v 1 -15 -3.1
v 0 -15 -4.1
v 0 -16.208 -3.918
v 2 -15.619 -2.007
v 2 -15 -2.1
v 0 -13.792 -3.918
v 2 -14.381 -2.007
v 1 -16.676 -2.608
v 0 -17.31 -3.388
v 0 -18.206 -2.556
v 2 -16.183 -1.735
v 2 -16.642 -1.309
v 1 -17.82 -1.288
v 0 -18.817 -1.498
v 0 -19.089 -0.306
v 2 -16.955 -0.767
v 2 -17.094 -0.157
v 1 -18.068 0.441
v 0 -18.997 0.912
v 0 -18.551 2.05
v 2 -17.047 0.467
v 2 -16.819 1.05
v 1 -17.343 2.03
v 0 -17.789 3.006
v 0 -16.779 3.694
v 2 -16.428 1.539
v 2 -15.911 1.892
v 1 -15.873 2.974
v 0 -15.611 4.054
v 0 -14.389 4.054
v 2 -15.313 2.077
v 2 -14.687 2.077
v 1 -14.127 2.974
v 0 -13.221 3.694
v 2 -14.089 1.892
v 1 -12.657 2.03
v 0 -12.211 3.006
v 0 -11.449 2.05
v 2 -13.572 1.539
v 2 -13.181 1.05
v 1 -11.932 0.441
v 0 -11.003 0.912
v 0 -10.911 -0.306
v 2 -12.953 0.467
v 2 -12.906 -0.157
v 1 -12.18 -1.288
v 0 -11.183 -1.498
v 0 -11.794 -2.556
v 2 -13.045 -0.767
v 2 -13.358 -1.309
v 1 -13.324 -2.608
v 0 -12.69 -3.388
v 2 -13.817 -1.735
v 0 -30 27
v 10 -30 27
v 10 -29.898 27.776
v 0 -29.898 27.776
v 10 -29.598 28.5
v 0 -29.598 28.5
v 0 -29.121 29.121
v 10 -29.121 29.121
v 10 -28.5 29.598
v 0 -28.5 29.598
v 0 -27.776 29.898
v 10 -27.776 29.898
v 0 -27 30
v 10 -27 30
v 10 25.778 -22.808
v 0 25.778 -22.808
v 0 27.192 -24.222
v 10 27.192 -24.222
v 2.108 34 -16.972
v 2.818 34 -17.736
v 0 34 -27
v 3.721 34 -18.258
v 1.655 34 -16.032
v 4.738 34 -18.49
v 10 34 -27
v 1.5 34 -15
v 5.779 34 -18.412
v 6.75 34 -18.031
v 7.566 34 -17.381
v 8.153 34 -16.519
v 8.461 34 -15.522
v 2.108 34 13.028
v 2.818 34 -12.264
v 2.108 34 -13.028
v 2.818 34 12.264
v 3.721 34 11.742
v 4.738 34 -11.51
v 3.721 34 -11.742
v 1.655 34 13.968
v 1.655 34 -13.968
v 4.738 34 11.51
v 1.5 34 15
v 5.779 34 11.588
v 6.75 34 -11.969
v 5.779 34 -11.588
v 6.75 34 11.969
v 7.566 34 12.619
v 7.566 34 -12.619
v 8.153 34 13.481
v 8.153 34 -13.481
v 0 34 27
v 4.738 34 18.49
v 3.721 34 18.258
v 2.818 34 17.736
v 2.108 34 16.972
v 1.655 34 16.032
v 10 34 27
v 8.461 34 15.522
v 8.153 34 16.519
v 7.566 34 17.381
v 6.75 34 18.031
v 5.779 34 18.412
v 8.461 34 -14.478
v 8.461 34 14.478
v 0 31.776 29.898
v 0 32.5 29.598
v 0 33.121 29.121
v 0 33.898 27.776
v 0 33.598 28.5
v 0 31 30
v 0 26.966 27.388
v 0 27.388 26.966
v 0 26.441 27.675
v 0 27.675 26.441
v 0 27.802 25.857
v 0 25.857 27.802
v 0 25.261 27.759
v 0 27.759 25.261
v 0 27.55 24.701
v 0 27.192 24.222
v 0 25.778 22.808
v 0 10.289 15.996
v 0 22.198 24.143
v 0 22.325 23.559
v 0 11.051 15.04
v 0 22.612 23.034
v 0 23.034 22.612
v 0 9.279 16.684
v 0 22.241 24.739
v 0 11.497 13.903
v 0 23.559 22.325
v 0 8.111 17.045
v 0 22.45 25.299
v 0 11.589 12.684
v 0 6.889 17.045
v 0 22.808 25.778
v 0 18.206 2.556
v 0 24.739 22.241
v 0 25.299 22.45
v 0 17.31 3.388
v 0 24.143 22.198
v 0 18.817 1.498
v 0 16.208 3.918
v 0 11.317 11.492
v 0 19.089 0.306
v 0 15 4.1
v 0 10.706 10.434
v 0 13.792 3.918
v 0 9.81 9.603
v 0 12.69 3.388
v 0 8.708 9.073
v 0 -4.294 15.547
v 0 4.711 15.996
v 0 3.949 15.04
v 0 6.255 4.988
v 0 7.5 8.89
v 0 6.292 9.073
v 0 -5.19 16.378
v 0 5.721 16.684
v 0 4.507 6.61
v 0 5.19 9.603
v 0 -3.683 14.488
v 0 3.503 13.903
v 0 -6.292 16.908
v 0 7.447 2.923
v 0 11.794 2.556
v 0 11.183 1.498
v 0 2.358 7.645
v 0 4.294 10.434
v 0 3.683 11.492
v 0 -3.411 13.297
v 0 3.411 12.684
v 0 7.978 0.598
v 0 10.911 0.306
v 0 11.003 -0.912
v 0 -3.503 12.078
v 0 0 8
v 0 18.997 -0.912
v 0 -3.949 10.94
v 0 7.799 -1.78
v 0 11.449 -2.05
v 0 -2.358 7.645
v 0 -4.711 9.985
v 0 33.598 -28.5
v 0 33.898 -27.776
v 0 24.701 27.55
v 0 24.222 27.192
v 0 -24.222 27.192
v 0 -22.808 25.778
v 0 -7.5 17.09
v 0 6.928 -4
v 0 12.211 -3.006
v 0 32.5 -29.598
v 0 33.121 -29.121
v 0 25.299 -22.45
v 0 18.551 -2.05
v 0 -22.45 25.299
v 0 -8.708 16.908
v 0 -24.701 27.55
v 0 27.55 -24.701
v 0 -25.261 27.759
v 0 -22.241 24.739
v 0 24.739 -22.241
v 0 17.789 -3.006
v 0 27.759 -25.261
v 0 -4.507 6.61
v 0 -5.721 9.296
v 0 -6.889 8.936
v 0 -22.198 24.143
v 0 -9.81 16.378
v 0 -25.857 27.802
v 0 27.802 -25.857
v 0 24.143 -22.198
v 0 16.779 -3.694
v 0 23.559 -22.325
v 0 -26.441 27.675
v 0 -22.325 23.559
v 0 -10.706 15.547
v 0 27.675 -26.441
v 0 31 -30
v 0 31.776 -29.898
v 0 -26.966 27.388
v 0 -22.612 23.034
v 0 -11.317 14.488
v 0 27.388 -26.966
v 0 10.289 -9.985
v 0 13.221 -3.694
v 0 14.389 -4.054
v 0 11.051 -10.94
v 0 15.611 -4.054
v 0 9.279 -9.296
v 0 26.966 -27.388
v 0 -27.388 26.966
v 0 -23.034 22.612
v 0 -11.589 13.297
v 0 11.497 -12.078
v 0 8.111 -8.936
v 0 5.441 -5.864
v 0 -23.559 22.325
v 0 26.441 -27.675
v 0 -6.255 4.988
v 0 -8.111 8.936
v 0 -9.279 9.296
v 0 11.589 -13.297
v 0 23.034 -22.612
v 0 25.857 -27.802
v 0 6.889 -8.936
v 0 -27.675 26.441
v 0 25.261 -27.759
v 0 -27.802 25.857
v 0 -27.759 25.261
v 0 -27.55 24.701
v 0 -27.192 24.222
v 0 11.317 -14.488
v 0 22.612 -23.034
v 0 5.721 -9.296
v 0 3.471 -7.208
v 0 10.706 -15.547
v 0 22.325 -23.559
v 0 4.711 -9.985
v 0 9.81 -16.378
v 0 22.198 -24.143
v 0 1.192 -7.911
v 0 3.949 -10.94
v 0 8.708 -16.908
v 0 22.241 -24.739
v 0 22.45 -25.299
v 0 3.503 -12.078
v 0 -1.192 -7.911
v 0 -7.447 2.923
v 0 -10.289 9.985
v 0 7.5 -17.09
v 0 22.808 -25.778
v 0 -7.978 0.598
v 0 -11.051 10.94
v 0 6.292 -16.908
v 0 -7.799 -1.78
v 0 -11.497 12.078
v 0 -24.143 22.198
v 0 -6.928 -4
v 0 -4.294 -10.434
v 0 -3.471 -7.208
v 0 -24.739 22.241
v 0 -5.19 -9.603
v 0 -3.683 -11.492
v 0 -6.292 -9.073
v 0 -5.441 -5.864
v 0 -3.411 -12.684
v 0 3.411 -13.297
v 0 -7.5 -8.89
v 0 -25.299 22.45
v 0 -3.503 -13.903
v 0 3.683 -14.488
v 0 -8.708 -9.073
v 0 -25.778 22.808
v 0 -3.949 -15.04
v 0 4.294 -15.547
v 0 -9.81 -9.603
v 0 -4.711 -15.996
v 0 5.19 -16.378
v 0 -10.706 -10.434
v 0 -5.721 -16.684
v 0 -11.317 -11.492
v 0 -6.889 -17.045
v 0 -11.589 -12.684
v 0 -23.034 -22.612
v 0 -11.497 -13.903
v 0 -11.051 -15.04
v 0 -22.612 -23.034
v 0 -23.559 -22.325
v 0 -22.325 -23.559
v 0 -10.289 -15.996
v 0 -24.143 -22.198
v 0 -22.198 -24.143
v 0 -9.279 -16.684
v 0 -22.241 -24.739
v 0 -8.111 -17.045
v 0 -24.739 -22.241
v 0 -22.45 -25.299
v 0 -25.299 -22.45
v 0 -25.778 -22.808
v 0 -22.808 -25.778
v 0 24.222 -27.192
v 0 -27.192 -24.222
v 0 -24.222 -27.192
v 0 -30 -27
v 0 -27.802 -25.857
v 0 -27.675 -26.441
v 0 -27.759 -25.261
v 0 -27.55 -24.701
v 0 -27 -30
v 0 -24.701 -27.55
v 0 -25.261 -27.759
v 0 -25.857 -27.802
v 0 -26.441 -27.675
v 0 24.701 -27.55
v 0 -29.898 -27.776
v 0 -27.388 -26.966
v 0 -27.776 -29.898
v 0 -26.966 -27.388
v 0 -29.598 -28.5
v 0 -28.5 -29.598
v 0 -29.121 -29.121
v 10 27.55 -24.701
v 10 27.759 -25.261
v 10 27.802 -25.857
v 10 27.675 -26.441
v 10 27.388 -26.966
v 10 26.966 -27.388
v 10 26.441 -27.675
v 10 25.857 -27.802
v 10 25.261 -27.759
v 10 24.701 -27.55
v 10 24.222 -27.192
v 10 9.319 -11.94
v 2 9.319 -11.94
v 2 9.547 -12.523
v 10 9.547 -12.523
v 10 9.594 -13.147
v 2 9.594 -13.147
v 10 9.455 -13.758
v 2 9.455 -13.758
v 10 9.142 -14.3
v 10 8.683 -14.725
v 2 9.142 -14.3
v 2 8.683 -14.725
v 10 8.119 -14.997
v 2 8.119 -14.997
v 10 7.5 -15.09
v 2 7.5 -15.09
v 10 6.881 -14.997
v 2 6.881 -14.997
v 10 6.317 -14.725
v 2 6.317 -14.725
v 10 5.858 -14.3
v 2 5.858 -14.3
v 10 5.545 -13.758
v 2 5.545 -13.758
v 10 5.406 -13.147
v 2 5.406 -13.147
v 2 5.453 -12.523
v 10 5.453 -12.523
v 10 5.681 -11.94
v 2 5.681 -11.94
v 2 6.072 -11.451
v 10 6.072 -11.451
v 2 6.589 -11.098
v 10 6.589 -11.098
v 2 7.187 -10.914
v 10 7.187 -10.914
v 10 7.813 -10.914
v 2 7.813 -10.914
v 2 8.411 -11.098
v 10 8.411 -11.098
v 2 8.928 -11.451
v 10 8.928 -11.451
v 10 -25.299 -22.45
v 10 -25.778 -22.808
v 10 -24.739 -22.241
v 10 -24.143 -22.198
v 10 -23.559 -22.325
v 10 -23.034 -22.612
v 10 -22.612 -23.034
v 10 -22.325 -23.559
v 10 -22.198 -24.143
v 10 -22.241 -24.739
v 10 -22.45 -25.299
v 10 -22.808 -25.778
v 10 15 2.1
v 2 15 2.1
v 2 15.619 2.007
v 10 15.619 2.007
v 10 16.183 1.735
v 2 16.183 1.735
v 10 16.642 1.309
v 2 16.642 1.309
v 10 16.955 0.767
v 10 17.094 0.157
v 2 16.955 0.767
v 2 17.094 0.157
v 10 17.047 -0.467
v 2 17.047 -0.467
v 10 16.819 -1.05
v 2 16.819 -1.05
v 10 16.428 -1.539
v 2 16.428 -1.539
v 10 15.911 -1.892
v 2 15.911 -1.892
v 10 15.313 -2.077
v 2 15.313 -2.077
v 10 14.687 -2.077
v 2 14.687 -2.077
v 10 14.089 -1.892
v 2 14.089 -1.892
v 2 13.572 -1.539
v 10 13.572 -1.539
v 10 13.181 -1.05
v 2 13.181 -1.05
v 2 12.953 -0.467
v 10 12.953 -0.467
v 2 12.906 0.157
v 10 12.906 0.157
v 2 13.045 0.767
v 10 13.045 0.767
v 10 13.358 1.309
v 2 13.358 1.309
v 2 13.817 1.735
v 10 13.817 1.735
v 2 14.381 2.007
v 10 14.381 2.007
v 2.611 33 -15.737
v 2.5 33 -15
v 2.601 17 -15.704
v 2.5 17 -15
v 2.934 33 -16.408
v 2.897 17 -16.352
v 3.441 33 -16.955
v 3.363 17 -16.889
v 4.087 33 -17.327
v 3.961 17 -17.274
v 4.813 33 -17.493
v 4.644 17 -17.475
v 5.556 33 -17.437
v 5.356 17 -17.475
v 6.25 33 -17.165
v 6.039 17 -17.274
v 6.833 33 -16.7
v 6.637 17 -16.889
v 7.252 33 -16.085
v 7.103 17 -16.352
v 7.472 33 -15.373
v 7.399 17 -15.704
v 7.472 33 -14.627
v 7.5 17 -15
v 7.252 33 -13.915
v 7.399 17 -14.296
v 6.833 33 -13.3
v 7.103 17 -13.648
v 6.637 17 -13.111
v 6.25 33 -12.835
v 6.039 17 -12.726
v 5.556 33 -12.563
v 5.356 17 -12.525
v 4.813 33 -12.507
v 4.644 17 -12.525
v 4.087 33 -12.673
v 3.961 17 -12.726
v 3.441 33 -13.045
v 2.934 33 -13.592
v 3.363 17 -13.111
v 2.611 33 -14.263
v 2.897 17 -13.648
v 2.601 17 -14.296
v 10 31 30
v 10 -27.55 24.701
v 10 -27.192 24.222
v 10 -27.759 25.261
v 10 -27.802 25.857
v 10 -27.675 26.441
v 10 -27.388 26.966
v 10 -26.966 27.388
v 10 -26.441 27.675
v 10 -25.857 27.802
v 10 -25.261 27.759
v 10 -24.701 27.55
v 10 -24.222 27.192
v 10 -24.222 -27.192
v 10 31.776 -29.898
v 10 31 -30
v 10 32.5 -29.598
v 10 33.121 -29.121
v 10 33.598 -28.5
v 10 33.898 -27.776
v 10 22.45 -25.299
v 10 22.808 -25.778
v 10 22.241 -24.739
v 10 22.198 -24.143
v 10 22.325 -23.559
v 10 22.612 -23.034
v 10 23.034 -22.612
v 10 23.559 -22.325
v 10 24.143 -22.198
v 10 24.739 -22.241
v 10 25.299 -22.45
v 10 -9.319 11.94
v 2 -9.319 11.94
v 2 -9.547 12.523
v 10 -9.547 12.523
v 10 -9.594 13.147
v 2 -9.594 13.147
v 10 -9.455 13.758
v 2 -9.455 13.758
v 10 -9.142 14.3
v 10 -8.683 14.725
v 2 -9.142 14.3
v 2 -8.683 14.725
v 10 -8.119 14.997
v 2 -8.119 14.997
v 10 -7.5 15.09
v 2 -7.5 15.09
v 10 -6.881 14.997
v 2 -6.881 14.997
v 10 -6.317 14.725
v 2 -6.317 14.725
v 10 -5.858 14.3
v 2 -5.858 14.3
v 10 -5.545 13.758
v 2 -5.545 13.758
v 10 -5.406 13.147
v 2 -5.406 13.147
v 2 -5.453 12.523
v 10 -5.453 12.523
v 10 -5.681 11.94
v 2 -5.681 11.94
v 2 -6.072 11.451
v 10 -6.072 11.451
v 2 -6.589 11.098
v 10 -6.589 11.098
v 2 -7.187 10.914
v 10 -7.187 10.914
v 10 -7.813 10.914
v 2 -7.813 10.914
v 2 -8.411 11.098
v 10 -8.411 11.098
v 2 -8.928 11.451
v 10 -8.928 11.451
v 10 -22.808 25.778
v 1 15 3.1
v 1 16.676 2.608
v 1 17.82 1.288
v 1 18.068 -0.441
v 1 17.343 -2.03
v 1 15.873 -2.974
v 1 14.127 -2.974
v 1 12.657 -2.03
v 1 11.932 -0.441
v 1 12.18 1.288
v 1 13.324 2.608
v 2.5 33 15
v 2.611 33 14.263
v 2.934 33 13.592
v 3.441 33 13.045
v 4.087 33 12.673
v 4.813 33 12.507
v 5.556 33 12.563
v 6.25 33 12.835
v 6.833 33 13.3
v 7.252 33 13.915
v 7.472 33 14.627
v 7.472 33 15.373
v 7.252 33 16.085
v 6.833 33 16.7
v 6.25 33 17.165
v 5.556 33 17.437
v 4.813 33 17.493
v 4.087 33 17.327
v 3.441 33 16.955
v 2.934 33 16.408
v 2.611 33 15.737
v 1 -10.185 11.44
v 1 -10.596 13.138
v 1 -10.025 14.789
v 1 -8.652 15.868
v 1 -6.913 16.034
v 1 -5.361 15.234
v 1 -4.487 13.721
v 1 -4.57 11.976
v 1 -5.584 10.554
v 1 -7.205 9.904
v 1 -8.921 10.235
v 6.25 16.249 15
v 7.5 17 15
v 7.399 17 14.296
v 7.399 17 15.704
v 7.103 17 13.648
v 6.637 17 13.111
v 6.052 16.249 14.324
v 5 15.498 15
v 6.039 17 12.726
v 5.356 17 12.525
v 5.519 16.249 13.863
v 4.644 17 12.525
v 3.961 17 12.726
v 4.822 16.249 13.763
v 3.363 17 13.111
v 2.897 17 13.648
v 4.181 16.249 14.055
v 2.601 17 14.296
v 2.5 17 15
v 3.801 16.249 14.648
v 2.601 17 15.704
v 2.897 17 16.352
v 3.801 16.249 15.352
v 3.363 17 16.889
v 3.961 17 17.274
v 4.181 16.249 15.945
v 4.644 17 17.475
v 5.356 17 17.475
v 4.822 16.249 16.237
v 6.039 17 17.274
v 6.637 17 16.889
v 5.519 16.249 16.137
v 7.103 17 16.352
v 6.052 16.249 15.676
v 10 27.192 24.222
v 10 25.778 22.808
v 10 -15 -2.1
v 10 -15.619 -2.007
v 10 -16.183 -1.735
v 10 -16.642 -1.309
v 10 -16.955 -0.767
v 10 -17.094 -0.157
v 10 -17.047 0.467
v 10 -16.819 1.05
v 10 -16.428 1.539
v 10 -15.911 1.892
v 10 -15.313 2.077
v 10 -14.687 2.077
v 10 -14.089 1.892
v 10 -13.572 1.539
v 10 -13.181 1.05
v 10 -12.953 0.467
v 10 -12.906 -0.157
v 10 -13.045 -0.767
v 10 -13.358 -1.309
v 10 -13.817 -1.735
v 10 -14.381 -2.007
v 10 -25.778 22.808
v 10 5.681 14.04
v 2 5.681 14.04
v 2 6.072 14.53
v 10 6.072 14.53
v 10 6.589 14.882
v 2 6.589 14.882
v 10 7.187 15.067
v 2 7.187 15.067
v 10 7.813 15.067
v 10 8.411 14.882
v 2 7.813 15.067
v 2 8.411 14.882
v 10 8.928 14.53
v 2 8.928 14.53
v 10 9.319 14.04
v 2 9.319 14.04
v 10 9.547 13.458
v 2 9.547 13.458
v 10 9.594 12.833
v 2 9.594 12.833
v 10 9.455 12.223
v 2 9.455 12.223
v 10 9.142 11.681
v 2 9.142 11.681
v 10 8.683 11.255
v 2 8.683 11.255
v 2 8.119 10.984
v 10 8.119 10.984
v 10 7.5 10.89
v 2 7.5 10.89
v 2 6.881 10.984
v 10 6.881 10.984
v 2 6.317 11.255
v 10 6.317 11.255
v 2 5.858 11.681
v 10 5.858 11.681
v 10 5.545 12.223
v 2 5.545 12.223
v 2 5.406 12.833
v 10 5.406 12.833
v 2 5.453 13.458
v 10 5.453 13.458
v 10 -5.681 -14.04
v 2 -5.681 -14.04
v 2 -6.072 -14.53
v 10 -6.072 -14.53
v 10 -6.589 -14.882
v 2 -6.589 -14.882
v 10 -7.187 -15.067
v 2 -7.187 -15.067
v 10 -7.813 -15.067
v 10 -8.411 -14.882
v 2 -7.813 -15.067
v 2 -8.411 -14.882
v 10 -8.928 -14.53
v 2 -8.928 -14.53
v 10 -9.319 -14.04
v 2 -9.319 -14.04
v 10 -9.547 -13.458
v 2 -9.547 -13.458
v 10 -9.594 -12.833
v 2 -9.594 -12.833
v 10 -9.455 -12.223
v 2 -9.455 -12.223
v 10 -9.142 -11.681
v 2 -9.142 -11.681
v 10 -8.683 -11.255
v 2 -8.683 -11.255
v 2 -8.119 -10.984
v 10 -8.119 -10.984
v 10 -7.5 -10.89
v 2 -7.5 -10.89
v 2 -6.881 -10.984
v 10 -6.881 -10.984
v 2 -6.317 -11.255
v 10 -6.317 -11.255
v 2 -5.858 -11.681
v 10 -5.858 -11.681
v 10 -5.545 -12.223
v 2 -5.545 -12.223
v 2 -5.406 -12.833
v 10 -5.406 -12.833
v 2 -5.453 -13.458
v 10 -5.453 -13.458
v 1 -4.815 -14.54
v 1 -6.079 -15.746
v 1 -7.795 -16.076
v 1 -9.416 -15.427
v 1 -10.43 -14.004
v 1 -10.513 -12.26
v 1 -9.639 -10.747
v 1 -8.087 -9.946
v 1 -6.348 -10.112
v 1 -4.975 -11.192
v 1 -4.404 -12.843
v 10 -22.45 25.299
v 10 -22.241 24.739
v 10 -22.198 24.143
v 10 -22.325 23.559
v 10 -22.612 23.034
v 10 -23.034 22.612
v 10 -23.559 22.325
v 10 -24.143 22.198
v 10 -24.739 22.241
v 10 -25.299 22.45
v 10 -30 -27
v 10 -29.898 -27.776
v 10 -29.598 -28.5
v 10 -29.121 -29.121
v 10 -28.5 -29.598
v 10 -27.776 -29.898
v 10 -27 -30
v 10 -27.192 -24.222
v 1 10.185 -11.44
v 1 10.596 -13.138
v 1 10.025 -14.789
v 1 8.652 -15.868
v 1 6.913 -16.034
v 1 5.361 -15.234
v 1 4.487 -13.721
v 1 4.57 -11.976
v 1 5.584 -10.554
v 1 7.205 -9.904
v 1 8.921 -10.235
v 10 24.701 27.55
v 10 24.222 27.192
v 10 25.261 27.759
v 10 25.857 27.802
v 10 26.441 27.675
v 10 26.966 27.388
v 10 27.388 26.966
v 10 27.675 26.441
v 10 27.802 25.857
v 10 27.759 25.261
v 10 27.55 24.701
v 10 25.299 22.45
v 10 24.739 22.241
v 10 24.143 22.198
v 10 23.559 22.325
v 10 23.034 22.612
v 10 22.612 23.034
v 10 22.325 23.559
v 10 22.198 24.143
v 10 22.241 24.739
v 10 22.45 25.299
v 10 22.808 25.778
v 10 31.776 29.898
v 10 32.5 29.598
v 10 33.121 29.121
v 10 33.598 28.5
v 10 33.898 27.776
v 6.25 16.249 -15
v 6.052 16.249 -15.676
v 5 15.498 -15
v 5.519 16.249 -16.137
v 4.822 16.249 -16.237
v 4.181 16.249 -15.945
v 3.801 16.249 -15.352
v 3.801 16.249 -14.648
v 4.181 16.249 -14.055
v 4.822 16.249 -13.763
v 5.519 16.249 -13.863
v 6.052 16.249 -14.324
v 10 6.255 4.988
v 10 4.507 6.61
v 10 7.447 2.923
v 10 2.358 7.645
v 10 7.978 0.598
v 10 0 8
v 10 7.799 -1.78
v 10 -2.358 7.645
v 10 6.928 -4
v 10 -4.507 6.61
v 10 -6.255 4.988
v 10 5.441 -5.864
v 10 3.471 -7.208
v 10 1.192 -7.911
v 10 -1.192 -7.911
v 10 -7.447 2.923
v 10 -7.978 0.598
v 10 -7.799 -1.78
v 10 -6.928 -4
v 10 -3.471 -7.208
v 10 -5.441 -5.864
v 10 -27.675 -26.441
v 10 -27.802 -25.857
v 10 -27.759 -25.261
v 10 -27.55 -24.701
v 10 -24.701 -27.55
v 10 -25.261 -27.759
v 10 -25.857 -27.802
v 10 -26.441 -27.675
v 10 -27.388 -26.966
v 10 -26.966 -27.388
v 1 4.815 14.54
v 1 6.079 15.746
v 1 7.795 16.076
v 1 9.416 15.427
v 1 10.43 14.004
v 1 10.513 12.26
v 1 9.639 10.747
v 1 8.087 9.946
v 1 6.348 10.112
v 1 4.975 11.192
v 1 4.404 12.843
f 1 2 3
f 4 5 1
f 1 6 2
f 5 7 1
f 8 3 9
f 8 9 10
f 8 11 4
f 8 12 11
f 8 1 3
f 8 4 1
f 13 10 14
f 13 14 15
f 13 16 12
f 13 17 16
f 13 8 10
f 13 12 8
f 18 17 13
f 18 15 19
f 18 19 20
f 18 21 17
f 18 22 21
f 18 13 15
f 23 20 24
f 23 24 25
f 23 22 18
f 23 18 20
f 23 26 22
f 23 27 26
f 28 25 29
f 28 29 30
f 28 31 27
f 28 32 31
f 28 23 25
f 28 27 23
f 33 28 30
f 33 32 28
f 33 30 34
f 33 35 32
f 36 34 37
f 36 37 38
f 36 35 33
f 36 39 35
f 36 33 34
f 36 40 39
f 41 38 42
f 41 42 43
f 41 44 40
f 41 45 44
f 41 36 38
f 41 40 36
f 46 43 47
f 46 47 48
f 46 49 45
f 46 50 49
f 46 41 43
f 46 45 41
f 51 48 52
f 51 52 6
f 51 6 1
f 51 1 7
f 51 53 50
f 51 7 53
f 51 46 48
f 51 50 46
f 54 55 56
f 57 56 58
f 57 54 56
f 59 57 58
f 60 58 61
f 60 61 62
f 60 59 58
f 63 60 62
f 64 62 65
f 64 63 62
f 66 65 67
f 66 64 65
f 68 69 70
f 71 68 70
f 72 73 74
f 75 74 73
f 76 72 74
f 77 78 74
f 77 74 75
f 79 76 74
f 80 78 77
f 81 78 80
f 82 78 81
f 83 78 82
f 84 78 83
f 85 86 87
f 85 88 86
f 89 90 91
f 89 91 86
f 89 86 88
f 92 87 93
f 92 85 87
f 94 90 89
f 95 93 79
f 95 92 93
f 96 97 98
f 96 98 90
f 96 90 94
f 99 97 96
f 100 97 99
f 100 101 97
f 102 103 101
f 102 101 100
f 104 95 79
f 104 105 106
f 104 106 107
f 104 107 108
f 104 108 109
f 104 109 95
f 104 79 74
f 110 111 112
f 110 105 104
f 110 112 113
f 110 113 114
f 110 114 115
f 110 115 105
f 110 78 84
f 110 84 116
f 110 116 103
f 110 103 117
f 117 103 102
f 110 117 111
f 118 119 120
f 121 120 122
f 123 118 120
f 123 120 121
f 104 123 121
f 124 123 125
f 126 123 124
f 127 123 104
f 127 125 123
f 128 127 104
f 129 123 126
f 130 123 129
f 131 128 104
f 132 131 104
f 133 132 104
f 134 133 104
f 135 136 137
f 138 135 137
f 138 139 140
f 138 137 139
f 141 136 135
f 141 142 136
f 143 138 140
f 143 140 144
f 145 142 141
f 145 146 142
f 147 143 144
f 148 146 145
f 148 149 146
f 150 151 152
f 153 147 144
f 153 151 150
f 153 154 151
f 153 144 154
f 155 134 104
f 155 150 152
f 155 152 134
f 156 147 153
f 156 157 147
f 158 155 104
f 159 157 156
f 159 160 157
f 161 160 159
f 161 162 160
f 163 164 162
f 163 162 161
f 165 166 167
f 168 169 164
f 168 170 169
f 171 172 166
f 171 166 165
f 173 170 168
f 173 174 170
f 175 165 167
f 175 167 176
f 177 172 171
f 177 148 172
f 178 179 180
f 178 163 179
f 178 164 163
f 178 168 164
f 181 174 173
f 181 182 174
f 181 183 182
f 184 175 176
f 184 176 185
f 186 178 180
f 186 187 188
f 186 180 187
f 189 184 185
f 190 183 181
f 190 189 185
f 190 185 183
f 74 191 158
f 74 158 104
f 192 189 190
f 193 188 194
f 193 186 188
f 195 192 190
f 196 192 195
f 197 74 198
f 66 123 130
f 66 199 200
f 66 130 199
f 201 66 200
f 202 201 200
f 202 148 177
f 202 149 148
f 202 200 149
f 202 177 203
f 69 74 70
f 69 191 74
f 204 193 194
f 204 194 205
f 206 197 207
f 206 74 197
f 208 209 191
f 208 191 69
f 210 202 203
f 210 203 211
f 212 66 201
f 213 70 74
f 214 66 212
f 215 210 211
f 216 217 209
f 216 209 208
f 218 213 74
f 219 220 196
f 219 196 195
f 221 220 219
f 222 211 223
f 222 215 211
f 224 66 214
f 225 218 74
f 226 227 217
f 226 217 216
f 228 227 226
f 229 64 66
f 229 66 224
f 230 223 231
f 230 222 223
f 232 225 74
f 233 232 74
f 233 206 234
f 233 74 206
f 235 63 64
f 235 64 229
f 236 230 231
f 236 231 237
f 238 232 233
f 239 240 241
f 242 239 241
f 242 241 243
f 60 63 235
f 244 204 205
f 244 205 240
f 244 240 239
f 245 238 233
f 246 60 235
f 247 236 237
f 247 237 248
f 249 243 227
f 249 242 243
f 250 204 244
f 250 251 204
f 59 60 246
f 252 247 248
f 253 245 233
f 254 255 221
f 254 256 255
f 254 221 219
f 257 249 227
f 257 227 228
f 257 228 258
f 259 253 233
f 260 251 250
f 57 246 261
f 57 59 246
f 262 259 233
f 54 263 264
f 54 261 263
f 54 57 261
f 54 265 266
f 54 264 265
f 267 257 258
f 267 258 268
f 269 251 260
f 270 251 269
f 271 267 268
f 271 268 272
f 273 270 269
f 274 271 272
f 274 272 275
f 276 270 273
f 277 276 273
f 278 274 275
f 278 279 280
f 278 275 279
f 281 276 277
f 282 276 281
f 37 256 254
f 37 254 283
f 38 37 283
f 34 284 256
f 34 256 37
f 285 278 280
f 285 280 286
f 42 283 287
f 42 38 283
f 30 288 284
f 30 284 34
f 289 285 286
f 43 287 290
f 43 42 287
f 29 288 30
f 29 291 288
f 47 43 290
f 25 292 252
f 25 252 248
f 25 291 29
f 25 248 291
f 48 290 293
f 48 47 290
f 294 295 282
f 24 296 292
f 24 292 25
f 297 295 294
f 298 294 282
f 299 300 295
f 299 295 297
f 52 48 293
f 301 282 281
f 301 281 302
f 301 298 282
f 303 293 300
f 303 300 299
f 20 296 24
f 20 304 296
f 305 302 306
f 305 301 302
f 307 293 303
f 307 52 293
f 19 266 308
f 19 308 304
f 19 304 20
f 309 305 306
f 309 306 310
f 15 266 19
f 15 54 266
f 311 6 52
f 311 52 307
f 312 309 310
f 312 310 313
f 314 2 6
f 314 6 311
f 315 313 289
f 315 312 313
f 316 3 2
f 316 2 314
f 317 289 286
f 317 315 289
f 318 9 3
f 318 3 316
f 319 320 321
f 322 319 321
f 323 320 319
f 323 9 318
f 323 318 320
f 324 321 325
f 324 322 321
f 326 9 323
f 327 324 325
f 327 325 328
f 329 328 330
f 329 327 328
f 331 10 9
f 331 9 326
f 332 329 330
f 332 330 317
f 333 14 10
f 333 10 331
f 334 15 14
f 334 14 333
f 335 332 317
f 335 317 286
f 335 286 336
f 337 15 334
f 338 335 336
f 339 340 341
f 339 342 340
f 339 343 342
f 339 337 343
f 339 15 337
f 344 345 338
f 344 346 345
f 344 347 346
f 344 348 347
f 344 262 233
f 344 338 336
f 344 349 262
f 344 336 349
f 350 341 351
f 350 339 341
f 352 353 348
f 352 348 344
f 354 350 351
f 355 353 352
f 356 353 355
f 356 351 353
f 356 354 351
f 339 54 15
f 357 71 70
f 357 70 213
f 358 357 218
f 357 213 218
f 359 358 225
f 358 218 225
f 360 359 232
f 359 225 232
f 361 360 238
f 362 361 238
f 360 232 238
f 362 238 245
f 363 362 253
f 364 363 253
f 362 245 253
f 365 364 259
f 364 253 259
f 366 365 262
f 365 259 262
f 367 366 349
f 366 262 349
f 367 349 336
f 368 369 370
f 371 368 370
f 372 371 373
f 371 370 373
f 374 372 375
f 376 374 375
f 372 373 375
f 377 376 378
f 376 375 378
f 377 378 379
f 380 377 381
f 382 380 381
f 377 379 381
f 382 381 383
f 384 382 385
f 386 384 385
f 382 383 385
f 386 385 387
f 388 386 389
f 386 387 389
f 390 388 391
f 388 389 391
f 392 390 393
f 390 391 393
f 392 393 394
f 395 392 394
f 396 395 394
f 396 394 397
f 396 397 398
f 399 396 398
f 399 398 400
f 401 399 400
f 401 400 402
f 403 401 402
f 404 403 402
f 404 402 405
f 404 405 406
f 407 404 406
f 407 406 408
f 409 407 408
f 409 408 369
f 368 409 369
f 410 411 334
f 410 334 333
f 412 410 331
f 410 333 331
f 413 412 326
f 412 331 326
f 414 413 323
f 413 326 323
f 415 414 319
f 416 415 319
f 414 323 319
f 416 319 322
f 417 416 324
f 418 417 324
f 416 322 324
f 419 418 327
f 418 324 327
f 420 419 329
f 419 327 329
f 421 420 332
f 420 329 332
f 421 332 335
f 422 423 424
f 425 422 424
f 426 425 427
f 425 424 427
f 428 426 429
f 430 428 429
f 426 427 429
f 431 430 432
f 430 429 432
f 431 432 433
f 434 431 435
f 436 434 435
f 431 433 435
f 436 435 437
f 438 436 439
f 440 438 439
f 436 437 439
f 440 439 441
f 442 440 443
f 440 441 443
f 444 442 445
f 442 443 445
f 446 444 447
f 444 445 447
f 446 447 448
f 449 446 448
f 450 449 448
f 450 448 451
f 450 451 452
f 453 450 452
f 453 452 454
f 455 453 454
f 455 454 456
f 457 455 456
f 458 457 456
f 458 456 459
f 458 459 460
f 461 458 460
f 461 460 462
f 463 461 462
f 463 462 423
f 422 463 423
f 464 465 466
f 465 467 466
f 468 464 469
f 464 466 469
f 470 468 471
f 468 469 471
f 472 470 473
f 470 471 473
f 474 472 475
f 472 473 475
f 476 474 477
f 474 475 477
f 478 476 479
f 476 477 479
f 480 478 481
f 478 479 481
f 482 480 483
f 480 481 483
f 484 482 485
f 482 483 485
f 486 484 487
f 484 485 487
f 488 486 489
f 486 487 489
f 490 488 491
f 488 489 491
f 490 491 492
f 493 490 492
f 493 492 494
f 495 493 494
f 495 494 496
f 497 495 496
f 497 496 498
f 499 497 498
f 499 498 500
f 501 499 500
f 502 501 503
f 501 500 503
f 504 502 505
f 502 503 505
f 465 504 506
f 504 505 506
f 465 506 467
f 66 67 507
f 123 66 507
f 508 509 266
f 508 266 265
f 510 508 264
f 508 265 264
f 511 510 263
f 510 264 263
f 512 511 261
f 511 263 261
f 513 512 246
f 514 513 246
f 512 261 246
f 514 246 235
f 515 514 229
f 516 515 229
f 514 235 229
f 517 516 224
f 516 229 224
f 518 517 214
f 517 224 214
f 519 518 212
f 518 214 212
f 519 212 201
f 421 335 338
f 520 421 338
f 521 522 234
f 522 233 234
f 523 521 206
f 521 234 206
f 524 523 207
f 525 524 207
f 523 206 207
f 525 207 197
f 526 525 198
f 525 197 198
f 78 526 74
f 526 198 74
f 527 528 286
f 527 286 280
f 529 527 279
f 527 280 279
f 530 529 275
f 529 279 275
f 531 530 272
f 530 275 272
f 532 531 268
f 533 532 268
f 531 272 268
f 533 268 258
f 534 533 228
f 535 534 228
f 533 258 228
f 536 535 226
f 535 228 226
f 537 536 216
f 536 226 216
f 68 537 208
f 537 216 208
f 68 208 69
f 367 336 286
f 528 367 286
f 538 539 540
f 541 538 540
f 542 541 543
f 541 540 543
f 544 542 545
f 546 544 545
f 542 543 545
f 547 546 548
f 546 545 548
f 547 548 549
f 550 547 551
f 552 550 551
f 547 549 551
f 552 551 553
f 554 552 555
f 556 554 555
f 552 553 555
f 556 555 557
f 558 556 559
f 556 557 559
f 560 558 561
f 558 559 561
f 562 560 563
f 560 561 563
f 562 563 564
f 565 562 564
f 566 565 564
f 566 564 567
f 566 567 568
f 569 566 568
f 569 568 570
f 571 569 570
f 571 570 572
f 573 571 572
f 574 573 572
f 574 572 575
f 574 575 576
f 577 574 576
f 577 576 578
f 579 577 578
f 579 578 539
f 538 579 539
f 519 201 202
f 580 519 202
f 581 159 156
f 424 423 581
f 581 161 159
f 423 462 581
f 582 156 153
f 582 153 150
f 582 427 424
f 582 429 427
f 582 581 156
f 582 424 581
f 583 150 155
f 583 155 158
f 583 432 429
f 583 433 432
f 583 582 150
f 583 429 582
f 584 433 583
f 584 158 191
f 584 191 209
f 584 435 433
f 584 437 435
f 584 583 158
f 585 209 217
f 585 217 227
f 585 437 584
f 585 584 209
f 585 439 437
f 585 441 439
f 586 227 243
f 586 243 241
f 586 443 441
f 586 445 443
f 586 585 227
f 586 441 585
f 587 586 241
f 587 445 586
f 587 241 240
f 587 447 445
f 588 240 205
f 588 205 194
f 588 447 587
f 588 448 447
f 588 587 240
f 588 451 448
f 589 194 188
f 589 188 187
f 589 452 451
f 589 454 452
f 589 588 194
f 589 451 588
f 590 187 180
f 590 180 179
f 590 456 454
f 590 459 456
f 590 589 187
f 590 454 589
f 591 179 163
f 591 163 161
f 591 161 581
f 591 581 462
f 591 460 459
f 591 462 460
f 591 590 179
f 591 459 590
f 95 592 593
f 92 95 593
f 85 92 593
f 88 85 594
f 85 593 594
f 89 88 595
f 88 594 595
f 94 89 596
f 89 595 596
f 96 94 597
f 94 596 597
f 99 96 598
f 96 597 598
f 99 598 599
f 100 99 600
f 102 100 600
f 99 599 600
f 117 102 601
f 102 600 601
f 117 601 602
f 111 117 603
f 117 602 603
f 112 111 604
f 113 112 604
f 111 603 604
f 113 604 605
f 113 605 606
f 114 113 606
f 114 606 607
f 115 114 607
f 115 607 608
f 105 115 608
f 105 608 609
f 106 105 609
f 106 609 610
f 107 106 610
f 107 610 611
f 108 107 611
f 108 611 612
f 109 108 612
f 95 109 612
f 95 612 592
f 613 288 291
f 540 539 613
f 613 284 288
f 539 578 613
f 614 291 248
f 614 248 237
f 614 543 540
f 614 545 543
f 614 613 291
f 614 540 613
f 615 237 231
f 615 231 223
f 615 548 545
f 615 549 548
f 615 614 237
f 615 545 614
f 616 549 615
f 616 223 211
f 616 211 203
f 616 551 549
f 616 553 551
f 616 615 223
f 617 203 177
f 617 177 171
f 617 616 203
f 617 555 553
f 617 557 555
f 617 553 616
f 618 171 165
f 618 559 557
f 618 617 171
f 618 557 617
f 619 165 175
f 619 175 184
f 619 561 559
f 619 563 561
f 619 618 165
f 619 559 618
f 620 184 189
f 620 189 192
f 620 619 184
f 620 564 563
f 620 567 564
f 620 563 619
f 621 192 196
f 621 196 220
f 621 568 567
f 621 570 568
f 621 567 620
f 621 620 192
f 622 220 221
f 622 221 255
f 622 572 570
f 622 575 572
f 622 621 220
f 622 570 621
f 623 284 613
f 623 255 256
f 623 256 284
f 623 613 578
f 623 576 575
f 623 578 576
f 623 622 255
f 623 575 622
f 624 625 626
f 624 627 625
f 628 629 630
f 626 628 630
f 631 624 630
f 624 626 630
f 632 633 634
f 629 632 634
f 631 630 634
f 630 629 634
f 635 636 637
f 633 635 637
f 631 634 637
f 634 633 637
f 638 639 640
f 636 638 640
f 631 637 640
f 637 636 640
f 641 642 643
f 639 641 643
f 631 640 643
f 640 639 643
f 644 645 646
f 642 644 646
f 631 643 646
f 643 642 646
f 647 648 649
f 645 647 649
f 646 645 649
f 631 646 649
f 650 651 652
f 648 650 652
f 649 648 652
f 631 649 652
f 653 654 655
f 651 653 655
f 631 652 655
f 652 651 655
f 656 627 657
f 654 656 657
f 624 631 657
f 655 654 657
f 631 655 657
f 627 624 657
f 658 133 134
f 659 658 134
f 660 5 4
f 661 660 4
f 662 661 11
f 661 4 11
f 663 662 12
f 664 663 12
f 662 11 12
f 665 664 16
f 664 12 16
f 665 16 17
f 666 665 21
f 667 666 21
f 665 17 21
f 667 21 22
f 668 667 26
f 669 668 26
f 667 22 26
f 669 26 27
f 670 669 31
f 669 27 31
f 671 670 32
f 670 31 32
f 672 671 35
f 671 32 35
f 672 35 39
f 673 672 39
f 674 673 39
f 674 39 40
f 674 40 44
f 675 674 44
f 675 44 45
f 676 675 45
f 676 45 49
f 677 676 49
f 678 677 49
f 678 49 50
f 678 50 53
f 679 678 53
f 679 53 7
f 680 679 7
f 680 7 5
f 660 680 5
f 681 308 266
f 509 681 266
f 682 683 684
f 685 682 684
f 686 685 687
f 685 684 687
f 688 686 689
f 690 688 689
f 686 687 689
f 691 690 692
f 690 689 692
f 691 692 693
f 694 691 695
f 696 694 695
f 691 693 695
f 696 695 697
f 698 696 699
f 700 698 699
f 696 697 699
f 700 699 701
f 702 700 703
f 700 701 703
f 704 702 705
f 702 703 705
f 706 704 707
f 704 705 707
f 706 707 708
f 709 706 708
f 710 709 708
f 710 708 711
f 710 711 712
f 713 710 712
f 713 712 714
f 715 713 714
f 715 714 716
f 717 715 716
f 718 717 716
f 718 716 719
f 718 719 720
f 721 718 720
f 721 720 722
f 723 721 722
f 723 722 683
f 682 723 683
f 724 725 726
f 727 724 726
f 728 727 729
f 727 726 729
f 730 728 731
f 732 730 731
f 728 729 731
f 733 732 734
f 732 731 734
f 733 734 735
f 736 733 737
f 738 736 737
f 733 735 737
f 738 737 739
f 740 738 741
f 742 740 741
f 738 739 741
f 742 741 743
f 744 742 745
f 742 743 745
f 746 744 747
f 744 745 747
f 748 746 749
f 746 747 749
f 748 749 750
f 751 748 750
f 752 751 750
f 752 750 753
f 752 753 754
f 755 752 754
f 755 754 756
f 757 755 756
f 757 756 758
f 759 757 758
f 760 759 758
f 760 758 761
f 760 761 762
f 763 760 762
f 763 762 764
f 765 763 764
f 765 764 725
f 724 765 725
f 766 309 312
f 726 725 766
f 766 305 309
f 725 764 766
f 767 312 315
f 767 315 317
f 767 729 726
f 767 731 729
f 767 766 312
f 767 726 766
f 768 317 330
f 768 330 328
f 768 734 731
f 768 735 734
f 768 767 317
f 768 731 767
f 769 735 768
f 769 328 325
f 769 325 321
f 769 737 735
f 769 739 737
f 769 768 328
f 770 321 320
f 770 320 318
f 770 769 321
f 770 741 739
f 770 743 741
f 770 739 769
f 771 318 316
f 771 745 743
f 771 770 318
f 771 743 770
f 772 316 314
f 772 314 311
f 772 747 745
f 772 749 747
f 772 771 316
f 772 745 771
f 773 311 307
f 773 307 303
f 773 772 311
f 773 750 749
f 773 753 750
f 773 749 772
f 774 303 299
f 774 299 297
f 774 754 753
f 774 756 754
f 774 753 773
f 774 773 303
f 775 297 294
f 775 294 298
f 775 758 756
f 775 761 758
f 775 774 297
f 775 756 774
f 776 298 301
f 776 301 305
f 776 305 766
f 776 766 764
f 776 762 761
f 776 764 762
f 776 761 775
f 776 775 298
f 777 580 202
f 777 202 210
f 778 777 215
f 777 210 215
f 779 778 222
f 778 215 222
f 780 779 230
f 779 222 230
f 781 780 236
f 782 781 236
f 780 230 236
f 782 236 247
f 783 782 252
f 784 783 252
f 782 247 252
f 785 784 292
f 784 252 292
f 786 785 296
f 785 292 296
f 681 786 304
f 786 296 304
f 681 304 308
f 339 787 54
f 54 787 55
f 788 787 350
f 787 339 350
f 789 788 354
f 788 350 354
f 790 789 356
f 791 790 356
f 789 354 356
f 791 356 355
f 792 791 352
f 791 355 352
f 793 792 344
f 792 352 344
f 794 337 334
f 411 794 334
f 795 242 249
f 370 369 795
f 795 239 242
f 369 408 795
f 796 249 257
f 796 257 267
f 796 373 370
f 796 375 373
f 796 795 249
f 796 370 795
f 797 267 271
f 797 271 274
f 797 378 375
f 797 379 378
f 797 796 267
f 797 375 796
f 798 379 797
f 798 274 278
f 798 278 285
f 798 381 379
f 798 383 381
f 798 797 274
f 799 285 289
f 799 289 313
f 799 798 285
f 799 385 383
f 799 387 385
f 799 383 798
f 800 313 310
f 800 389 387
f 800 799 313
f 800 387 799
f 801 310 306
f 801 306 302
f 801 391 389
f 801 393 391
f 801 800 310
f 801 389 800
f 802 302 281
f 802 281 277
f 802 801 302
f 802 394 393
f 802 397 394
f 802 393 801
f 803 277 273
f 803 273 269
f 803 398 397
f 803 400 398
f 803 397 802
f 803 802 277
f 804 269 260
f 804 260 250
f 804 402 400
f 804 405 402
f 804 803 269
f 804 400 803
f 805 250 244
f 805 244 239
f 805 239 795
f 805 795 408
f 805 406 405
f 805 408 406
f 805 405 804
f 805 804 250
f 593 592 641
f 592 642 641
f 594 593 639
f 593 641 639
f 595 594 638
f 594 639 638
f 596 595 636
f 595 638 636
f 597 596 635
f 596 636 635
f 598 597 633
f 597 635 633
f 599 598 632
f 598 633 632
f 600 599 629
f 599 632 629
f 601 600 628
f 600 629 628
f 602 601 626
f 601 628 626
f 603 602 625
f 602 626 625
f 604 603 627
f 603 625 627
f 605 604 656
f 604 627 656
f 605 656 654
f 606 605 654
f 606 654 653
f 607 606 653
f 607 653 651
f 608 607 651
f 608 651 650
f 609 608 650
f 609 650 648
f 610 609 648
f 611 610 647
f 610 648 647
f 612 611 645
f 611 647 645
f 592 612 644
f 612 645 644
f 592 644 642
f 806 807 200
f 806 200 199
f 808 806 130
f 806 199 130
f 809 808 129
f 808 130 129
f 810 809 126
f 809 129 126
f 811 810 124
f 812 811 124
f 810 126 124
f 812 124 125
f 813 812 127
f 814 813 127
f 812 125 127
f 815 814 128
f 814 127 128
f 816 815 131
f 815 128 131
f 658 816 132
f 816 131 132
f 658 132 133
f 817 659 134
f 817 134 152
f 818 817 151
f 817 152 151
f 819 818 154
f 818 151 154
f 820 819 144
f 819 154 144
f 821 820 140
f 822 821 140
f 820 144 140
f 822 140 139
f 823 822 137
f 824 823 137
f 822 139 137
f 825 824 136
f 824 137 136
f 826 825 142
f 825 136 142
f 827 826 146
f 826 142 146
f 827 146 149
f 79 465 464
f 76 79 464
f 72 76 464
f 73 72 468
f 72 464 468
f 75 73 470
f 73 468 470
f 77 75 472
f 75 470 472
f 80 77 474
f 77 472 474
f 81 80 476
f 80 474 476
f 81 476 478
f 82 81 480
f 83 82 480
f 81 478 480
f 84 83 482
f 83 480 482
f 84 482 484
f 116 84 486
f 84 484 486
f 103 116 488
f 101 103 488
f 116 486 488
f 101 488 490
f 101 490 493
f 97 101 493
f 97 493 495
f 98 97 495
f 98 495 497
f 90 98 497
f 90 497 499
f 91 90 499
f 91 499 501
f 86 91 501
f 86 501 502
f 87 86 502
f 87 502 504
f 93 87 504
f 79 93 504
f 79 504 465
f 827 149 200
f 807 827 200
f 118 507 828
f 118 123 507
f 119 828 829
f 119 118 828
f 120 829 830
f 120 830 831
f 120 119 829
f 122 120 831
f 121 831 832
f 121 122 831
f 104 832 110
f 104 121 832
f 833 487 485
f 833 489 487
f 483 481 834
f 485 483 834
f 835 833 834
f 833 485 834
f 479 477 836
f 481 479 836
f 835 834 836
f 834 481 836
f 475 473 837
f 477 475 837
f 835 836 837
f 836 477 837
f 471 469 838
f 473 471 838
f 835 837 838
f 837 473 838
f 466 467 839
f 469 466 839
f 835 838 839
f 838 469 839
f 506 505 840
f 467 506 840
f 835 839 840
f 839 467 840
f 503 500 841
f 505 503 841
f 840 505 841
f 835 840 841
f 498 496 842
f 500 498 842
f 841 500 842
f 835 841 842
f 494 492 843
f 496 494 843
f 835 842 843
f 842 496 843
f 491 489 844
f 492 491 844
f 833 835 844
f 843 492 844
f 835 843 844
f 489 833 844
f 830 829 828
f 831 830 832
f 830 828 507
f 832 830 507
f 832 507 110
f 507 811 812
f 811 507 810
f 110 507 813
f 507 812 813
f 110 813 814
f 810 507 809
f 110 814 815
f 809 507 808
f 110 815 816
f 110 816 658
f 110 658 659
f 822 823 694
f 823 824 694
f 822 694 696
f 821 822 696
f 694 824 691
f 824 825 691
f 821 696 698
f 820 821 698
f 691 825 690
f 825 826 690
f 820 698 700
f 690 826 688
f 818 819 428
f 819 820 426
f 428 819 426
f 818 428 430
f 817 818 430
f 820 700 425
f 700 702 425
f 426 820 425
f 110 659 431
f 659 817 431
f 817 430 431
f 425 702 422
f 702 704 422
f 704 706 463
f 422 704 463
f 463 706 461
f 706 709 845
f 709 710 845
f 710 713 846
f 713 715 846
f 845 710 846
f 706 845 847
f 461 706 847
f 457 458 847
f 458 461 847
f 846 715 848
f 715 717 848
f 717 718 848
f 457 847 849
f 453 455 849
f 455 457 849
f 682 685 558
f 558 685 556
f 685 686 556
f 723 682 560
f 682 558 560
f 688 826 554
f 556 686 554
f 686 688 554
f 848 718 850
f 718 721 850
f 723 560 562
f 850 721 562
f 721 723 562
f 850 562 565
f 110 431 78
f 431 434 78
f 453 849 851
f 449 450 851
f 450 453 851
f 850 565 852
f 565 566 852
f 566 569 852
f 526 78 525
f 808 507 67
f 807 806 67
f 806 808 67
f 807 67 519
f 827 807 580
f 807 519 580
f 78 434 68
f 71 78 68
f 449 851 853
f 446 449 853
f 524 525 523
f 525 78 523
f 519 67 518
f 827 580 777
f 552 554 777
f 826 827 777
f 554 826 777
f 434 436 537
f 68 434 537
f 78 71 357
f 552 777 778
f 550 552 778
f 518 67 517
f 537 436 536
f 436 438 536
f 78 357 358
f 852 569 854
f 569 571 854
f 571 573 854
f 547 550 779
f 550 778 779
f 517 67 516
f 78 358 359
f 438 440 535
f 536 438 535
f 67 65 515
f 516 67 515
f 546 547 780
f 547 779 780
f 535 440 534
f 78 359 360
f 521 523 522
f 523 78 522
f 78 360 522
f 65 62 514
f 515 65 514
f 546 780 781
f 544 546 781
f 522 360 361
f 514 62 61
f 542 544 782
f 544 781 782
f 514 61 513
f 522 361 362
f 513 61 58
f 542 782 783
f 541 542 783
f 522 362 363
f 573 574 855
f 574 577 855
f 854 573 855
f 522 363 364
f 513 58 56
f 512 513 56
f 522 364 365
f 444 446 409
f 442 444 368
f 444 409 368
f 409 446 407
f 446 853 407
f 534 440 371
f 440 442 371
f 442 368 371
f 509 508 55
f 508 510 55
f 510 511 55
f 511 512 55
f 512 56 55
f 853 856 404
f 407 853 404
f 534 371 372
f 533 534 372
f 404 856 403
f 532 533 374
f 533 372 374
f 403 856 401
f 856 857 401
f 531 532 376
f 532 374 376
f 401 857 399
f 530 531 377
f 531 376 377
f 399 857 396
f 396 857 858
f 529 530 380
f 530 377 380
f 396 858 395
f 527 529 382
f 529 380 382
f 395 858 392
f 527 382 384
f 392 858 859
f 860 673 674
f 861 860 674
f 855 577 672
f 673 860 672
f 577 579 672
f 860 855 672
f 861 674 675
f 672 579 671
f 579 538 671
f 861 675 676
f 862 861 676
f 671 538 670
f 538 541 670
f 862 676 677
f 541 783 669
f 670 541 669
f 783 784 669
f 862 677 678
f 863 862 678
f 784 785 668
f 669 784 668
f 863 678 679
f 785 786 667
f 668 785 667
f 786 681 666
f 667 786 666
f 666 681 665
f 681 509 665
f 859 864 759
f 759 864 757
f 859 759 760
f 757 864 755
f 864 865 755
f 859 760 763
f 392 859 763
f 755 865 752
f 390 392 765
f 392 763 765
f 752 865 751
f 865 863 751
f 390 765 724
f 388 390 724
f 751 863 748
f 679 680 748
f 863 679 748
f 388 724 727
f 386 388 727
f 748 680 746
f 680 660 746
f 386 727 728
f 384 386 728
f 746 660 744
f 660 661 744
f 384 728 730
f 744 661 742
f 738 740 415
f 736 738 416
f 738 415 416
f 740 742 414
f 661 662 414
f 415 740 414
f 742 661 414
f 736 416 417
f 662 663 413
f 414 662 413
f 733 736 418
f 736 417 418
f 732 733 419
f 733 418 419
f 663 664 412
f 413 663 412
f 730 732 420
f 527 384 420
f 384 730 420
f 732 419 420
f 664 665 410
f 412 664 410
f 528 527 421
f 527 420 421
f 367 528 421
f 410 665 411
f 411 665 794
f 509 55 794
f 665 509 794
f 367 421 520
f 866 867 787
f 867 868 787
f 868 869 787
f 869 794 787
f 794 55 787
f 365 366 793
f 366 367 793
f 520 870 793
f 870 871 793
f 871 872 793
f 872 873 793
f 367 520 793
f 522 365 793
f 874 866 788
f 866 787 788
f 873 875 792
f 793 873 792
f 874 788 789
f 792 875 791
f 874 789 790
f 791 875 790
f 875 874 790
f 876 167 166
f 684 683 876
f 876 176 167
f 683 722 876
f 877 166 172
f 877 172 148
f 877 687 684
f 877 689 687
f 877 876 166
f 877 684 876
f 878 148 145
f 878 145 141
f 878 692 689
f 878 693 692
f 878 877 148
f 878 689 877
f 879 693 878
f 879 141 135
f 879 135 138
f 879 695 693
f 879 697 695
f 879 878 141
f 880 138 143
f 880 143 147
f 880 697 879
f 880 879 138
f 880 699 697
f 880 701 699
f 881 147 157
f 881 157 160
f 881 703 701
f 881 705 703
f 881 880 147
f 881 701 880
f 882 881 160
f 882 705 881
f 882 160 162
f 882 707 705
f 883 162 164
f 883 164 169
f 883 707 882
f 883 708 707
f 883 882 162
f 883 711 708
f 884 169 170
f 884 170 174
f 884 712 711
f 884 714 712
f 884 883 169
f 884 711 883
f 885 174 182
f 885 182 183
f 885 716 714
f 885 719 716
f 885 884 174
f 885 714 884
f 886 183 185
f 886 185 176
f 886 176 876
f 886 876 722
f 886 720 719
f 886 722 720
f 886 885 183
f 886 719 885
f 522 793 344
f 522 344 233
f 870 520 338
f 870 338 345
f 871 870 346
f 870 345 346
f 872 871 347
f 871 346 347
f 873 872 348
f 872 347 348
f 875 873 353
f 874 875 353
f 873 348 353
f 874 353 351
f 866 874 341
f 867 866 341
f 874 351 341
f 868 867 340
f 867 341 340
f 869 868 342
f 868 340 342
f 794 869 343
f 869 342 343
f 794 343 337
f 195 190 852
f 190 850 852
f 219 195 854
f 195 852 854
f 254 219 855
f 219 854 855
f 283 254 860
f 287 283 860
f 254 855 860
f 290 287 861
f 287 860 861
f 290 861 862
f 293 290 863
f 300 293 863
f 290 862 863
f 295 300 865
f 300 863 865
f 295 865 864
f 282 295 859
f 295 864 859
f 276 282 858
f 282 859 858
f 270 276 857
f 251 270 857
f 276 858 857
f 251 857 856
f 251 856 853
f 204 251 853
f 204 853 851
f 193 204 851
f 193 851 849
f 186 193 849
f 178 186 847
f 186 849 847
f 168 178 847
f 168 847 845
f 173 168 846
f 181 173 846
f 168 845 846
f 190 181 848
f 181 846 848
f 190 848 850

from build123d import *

# Parameters (mm, degrees)
SKETCH_1_W                  = 10
SKETCH_1_H                  = 42
CUT_EXTRUDE_4_DEPTH         = 72.414284285
CUT_EXTRUDE_4_DEPTH_BACK    = 72.414284285
SKETCH_7_R                  = 50
SKETCH_7_W                  = 60
SKETCH_7_H                  = 64
CUT_EXTRUDE_2_REACH         = 48.433
SKETCH_5_R                  = 2.1
PATTERN_CIRCULAR_1_COUNT    = 6
CUT_EXTRUDE_3_DEPTH         = 47.432747065
PATTERN_CIRCULAR_2_COUNT    = 4
HOLE_WIZARD_M61_D           = 5
HOLE_WIZARD_M61_DEPTH       = 17
HOLE_WIZARD_M61_CSINK_D     = 7
HOLE_WIZARD_M61_CSINK_ANGLE = 90
HOLE_WIZARD_M61_TIP         = 1.502151548
CHAMFER_1_SIZE              = 2
FILLET_1_R                  = 3


with BuildPart() as part:
    # Эскиз1 → Повернуть1 (revolve)
    with BuildSketch(Plane.XY, mode=Mode.PRIVATE) as revolve_1_sk:
        with Locations((5, 29)):
            Rectangle(SKETCH_1_W, SKETCH_1_H)
    revolve(revolve_1_sk.sketch.rotate(Axis((-29.36512031, 0, 0), (1, 0, 0)), 90), axis=Axis((-29.36512031, 0, 0), (1, 0, 0)))

    # Эскиз7 → Вырез-Вытянуть4 (cut, two sides: drawn at the far end of the back side and taken through both)
    with BuildSketch(Plane.ZY.offset(-CUT_EXTRUDE_4_DEPTH_BACK)):
        Circle(SKETCH_7_R)
        with Locations((0, 2)):
            Rectangle(SKETCH_7_W, SKETCH_7_H, mode=Mode.SUBTRACT)
    extrude(amount=CUT_EXTRUDE_4_DEPTH + CUT_EXTRUDE_4_DEPTH_BACK, mode=Mode.SUBTRACT)

    # Эскиз5 → Вырез-Вытянуть2 (cut, up to next)
    with BuildSketch(Plane.ZY, mode=Mode.PRIVATE) as cut_extrude_2_sk1:
        with Locations((0, 15)):
            Circle(SKETCH_5_R)
    cut_extrude_2_tool1 = extrude(cut_extrude_2_sk1.sketch, amount=-CUT_EXTRUDE_2_REACH, mode=Mode.PRIVATE) & part.part
    cut_extrude_2 = cut_extrude_2_tool1.solids().sort_by_distance((0, 15, 0))[0]
    add(cut_extrude_2, mode=Mode.SUBTRACT)

    # Круговой массив1: Вырез-Вытянуть2 ×6 about axis
    pattern_circular_1_axis = Axis((0, 0, 0), (1, 0, 0))
    for i in range(1, PATTERN_CIRCULAR_1_COUNT):
        add(cut_extrude_2.rotate(pattern_circular_1_axis, i * 360 / PATTERN_CIRCULAR_1_COUNT), mode=Mode.SUBTRACT)

    # Эскиз6 → Вырез-Вытянуть3 (cut, symmetric)
    with BuildSketch(Plane.ZY):
        with BuildLine():
            Line((-27.192031022, 24.222182541), (-25.777817459, 22.807968978))
            ThreePointArc((-25.777817459, 22.807968978), (-22.807968978, 22.807968978), (-22.807968978, 25.777817459))
            Line((-22.807968978, 25.777817459), (-24.222182541, 27.192031022))
            ThreePointArc((-24.222182541, 27.192031022), (-27.192031022, 27.192031022), (-27.192031022, 24.222182541))
        make_face()
    cut_extrude_3 = extrude(amount=CUT_EXTRUDE_3_DEPTH, both=True, mode=Mode.SUBTRACT)

    # Круговой массив2: Вырез-Вытянуть3 ×4 about axis
    pattern_circular_2_axis = Axis((0, 0, 0), (1, 0, 0))
    for i in range(1, PATTERN_CIRCULAR_2_COUNT):
        add(cut_extrude_3.rotate(pattern_circular_2_axis, i * 360 / PATTERN_CIRCULAR_2_COUNT), mode=Mode.SUBTRACT)

    # Отверстие обработанное метчиком M61
    with Locations(Plane(origin=(0, 34, 0), x_dir=(1, 0, 0), z_dir=(0, 1, 0))):
        with Locations((5, 15), (5, -15)):
            CounterSinkHole(HOLE_WIZARD_M61_D / 2, HOLE_WIZARD_M61_CSINK_D / 2, depth=HOLE_WIZARD_M61_DEPTH, counter_sink_angle=HOLE_WIZARD_M61_CSINK_ANGLE)
            with Locations((0, 0, -(HOLE_WIZARD_M61_DEPTH + HOLE_WIZARD_M61_TIP / 2))):  # 118° drill point
                Cone(0, HOLE_WIZARD_M61_D / 2, HOLE_WIZARD_M61_TIP, mode=Mode.SUBTRACT)

    # Фаска1
    chamfer_1_edges = [part.edges().sort_by_distance(p)[0] for p in [
        (0, 15, -2.1),
        (0, 9.318653348, 11.940381057),
        (0, -5.681346652, 14.040381057),
        (0, -15, 2.1),
        (0, -9.318653348, -11.940381057),
        (0, 5.681346652, -14.040381057),
    ]]
    chamfer(chamfer_1_edges, length=CHAMFER_1_SIZE)

    # Скругление1
    fillet_1_edges = [part.edges().sort_by_distance(p)[0] for p in [
        (5, 34, -30),
        (5, 34, 30),
        (5, -30, 30),
        (5, -30, -30),
    ]]
    fillet(fillet_1_edges, radius=FILLET_1_R)


solid = part.part
